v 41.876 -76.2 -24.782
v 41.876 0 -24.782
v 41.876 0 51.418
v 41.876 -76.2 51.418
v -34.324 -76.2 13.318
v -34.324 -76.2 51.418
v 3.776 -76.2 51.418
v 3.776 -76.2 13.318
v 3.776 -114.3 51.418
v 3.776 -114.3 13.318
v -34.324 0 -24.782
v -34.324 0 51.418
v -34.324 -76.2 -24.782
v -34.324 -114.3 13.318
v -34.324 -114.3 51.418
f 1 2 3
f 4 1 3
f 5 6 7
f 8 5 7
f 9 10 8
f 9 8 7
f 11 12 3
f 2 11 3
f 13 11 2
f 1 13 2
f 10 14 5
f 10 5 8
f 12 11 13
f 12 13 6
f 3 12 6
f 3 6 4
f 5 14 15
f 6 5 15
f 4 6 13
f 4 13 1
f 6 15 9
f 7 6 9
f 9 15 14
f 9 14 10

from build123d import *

# Parameters (mm, degrees)
F0_W     = 76.2
F0_H     = 76.2
F1_DEPTH = 76.2
F2_W     = 38.1
F2_H     = 38.1
F3_DEPTH = 38.1


with BuildPart() as f1:
    # F0 (on Front) → F1 (new body)
    with BuildSketch(Plane.XZ):
        with Locations((3.776283, 13.31814)):
            Rectangle(F0_W, F0_H)
    extrude(amount=F1_DEPTH)


with BuildPart() as f3:
    # F2 (on face) → F3 (new body)
    with BuildSketch(Plane.XZ.offset(76.2)):
        with Locations((-15.273717, 32.36814)):
            Rectangle(F2_W, F2_H)
    extrude(amount=F3_DEPTH)


solid = Compound([f1.part, f3.part])
